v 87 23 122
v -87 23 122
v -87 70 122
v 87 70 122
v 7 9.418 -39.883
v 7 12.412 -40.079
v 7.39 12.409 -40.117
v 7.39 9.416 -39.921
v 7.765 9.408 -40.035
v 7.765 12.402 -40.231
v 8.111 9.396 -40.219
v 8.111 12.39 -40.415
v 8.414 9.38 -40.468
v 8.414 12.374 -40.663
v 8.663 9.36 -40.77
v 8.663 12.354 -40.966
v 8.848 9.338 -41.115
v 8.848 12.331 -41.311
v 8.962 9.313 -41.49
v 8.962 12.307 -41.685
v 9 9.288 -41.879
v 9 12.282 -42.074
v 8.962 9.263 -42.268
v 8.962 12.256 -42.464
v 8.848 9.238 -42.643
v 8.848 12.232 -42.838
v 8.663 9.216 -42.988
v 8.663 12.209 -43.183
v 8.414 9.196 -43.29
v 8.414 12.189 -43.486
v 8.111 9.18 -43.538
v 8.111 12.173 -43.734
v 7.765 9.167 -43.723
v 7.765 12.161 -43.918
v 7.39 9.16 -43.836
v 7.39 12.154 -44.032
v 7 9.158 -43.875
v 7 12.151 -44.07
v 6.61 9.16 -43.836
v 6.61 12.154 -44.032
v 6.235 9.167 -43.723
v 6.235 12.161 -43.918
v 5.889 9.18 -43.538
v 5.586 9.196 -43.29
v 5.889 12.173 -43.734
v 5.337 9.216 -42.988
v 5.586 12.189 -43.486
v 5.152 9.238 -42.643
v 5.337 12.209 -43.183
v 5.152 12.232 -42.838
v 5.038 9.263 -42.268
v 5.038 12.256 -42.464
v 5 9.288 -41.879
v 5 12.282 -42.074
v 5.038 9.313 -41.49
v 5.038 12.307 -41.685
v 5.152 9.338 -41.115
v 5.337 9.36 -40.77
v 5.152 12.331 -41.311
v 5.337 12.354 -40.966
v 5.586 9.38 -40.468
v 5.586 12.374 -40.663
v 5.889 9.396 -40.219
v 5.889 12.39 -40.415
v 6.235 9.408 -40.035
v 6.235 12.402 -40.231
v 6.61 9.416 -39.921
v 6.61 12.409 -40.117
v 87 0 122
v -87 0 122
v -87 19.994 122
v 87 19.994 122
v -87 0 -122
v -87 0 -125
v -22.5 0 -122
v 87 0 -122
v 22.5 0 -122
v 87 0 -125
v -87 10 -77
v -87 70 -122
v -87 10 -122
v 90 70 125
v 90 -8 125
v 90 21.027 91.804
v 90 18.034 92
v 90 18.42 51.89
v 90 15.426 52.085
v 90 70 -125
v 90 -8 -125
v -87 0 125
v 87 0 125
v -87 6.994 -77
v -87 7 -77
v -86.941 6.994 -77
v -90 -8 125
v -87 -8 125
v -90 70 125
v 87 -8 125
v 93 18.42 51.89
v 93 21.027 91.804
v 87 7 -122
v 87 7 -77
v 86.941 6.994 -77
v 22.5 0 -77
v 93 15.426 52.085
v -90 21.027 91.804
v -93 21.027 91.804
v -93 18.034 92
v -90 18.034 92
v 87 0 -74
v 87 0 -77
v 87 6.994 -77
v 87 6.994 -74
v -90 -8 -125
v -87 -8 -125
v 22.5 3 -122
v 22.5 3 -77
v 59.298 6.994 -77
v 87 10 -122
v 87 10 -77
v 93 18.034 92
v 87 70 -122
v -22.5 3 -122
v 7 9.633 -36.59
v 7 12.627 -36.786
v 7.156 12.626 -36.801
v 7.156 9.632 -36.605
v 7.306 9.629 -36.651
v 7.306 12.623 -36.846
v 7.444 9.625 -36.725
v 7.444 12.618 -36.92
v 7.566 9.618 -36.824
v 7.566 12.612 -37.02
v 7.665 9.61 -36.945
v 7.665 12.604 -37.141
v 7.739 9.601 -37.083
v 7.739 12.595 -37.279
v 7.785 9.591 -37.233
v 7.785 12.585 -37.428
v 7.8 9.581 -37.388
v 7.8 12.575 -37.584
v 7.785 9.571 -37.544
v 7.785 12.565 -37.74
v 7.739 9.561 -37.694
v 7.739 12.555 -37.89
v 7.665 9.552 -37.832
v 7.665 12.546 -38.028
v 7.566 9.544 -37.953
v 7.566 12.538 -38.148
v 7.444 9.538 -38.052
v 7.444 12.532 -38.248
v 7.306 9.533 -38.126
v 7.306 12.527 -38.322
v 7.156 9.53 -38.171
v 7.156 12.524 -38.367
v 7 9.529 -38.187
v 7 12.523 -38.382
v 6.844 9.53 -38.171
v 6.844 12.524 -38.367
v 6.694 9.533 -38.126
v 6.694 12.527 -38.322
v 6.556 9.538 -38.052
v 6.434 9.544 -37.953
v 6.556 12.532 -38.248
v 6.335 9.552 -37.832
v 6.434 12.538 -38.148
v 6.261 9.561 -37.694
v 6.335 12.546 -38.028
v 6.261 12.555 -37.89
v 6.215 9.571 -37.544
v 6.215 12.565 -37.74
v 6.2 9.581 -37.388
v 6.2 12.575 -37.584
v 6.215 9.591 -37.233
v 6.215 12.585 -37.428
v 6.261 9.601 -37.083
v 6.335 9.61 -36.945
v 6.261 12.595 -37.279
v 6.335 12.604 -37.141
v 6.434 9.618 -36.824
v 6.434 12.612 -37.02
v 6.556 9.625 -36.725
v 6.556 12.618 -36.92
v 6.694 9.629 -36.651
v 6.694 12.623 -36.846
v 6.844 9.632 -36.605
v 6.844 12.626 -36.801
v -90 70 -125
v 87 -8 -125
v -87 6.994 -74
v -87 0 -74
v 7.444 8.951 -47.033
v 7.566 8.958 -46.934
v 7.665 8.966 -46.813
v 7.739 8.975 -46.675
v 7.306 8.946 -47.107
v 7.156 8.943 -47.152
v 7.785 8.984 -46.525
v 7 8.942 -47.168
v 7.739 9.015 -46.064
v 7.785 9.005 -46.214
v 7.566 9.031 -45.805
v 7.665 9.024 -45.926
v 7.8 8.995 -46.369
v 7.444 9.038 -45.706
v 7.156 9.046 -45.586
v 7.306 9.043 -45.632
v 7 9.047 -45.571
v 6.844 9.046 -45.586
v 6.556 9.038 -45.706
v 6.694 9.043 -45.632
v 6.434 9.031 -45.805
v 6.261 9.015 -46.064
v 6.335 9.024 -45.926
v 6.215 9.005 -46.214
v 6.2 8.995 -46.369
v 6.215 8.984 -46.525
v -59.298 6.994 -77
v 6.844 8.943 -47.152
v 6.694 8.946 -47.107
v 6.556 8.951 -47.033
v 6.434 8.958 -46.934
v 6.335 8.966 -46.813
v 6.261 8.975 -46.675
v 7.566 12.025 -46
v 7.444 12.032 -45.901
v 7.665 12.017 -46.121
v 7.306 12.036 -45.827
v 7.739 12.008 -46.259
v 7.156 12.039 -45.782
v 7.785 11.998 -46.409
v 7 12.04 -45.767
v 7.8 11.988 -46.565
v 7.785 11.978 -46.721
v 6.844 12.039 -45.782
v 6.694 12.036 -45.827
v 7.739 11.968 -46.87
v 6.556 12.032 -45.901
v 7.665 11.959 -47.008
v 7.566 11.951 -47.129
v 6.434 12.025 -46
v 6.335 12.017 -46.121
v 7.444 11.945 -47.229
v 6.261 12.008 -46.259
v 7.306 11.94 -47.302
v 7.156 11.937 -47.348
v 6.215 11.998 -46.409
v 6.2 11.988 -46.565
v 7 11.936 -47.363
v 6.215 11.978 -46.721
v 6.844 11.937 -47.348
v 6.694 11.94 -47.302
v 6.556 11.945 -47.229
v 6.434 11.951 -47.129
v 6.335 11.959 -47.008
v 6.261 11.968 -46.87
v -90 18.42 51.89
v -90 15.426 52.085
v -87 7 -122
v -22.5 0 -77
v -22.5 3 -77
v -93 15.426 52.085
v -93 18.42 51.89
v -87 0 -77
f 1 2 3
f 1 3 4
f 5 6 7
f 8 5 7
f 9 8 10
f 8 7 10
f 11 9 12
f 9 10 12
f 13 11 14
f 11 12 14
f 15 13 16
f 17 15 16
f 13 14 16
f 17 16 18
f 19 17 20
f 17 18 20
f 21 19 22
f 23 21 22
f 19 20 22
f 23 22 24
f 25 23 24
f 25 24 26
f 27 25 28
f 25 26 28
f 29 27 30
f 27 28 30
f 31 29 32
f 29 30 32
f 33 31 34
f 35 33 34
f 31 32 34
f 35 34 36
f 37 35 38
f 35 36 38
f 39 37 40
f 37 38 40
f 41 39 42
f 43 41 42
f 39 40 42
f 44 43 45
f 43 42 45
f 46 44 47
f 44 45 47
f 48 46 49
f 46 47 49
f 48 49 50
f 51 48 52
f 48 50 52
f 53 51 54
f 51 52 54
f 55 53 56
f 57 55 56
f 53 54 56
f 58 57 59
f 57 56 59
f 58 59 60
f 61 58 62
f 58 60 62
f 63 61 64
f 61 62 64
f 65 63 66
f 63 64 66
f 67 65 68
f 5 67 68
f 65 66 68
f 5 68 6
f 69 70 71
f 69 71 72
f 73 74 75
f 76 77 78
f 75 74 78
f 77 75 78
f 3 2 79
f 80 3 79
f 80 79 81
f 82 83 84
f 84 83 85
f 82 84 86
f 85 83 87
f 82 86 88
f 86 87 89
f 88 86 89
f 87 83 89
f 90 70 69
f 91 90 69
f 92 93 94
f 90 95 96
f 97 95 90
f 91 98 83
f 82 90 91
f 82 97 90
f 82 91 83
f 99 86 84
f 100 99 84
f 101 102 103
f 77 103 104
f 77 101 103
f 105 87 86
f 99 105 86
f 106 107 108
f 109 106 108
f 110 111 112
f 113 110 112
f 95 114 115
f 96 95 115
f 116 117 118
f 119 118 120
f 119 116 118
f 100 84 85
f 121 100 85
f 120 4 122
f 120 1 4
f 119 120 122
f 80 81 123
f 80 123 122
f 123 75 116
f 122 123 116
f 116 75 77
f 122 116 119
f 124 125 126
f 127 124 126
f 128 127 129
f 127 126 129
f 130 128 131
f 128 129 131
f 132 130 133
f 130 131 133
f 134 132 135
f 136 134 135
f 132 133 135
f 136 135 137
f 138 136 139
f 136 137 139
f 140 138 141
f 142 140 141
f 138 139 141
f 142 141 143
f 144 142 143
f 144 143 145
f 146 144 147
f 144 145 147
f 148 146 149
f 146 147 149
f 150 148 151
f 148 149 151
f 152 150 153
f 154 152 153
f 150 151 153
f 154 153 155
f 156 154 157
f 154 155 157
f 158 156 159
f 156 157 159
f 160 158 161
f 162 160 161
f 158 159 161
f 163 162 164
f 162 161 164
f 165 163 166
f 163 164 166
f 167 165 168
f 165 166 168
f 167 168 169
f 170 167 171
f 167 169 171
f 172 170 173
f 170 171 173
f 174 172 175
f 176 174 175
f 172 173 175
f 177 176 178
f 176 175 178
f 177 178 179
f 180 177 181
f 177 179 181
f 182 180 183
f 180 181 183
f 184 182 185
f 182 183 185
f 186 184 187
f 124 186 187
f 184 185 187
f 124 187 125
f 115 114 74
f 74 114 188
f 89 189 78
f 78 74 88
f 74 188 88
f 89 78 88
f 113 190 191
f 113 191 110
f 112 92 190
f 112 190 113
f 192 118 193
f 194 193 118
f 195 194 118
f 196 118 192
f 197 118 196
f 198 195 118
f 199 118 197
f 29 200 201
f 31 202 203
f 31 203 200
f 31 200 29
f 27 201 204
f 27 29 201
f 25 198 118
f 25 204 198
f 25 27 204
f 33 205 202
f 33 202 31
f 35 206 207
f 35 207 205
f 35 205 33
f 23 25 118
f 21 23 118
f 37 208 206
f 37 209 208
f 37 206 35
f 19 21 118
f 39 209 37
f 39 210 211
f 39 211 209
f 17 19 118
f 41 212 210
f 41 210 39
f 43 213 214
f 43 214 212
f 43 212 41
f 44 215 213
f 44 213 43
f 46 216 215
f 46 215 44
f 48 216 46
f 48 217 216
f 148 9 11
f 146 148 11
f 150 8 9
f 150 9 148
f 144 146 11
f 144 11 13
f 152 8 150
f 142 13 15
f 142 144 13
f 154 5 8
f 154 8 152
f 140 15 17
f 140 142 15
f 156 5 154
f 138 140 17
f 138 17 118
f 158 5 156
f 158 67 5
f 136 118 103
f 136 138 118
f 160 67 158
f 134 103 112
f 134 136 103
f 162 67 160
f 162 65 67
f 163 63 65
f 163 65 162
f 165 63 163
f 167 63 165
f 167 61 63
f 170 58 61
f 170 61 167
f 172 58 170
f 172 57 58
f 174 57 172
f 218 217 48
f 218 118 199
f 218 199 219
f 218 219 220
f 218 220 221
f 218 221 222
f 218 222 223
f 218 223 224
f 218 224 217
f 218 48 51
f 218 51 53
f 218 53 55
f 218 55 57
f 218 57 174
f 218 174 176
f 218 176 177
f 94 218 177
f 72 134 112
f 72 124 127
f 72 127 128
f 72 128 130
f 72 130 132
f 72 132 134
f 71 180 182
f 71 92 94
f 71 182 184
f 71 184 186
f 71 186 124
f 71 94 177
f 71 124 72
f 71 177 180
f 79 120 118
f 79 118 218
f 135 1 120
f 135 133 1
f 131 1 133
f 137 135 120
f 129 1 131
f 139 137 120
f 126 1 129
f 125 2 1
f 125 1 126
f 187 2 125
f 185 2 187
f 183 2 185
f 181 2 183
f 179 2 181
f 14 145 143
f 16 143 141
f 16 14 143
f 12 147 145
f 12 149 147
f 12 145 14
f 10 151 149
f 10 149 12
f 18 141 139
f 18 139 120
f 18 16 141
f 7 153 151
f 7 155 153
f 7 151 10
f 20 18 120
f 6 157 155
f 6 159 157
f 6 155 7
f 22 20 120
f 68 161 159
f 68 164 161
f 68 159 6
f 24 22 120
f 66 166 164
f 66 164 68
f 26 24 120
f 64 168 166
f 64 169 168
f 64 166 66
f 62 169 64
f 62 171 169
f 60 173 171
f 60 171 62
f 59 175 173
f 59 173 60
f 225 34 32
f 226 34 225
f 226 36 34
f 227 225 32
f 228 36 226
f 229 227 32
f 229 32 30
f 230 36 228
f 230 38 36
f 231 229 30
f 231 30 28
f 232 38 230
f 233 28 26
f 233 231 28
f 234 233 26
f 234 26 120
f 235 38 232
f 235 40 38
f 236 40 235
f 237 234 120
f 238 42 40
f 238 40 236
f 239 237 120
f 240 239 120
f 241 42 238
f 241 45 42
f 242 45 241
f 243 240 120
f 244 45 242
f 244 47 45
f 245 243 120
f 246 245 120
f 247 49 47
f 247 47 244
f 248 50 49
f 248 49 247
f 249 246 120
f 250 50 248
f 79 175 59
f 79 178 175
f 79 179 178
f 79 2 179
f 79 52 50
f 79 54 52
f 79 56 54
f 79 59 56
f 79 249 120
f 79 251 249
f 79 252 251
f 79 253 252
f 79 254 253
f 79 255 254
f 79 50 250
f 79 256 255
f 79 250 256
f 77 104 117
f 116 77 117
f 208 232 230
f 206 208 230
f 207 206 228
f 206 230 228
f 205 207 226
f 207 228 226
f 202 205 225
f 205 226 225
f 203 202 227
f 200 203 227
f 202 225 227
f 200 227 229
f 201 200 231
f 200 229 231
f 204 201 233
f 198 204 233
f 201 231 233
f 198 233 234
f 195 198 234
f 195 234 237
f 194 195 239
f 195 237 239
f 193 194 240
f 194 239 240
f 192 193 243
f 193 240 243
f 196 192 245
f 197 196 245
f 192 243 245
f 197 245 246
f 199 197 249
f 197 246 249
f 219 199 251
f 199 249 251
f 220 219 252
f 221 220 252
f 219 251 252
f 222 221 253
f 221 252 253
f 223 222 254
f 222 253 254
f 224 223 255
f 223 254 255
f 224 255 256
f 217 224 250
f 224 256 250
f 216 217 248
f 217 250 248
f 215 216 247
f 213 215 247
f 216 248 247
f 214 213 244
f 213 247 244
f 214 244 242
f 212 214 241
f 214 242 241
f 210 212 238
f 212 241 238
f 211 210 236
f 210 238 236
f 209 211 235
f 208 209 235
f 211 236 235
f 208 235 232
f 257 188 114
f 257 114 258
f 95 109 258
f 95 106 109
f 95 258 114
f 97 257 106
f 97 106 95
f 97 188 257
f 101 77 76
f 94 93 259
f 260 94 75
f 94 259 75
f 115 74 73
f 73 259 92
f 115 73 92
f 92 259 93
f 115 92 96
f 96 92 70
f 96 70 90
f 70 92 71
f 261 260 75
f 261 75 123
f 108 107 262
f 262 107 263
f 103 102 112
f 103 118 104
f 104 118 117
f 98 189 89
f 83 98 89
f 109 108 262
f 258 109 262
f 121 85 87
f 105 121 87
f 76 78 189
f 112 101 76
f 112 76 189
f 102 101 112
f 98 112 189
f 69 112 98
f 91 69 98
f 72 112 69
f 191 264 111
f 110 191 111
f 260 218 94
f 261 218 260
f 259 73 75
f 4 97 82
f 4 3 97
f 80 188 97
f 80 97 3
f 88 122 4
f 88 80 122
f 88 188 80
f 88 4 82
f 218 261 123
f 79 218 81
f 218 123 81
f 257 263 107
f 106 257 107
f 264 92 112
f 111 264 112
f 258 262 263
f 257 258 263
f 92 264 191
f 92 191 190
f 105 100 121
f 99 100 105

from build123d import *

# Parameters (mm, degrees)
SKETCH_1_W           = 180
SKETCH_1_H           = 250
EXTRUDE_1_DEPTH      = 70
SHELL_1_T            = -3
EXTRUDE_2_REACH      = 229.715
EXTRUDE_3_DEPTH      = 45
SKETCH_5_W           = 174
SKETCH_5_H           = 6.993605462
EXTRUDE_6_DEPTH      = 3
EXTRUDE_7_DEPTH      = 180
EXTRUDE_7_DEPTH_BACK = 6
SKETCH_12_W          = 3
SKETCH_12_H          = 250
EXTRUDE_8_DEPTH      = 8
SKETCH_13_R          = 2
SKETCH_13_R_2        = 0.8
CUT_EXTRUDE_1_DEPTH  = 3


with BuildPart() as part:
    # 草图1 → 凸台-拉伸1 (new body)
    with BuildSketch(Plane(origin=(0, 0, 0), x_dir=(1, 0, 0), z_dir=(0, 1, 0))):
        Rectangle(SKETCH_1_W, SKETCH_1_H)
    extrude(amount=EXTRUDE_1_DEPTH)

    # 抽壳1
    shell_1_openings = [part.faces().sort_by_distance(p)[0] for p in [
        (0, 70, 0),
        (0, 0, 0),
    ]]
    offset(amount=SHELL_1_T, openings=shell_1_openings, kind=Kind.INTERSECTION)

    # 草图3 → 凸台-拉伸2 (add, up to next)
    with BuildSketch(Plane(origin=(-87, 0, 0), x_dir=(0, 0, -1), z_dir=(1, 0, 0)), mode=Mode.PRIVATE) as extrude_2_sk1:
        Polygon((-122, 23), (77, 10), (77, 6.993605462), (-122, 19.993605462), align=None)
    extrude_2_tool1 = extrude(extrude_2_sk1.sketch, amount=EXTRUDE_2_REACH, mode=Mode.PRIVATE) - part.part
    add(extrude_2_tool1.solids().sort_by_distance((-87, 14.996803, 22.5))[0])

    # 草图4 → 凸台-拉伸3 (add)
    with BuildSketch(Plane.XY.offset(-122)):
        Polygon((-87, 10), (-87, 7), (-22.5, 0), (-22.5, 3), align=None)
        Polygon((22.5, 3), (87, 10), (87, 7), (22.5, 0), align=None)
    extrude(amount=EXTRUDE_3_DEPTH)

    # 草图6 → 凸台-拉伸7 (add, two sides: drawn at the far end of the back side and taken through both)
    with BuildSketch(Plane(origin=(-87, 0, 0), x_dir=(0, 0, -1), z_dir=(1, 0, 0)).offset(-EXTRUDE_7_DEPTH_BACK)):
        Polygon((-92, 18.033806467), (-52.085079166, 15.426299075), (-51.889516111, 18.419918138), (-91.804436946, 21.027425529), align=None)
    extrude(amount=EXTRUDE_7_DEPTH + EXTRUDE_7_DEPTH_BACK)

    # 草图12 → 凸台-拉伸8 (add)
    with BuildSketch(Plane.XZ):
        with Locations((-88.5, 0)):
            Rectangle(SKETCH_12_W, SKETCH_12_H)
        with Locations((88.5, 0)):
            Rectangle(SKETCH_12_W, SKETCH_12_H)
    extrude(amount=EXTRUDE_8_DEPTH)

    # 草图13 → 切除-拉伸1 (cut)
    with BuildSketch(Plane(origin=(0, 14.966281116, -0.977696756), x_dir=(1, 0, 0), z_dir=(0, 0.9978730208564016, -0.06518768477956395))):
        with Locations(Location((7, 41.184345758, 0), (0, 0, 270))):
            Circle(SKETCH_13_R)
        with Locations(Location((7, 45.684345758, 0), (0, 0, 270))):
            Circle(SKETCH_13_R_2)
        with Locations(Location((7, 36.684345758, 0), (0, 0, 270))):
            Circle(SKETCH_13_R_2)
    extrude(amount=-CUT_EXTRUDE_1_DEPTH, mode=Mode.SUBTRACT)


with BuildPart() as body_2:
    # 草图5 → 凸台-拉伸6 (new body)
    with BuildSketch(Plane.XY.offset(-77)):
        with Locations((0, 3.496802731)):
            Rectangle(SKETCH_5_W, SKETCH_5_H)
    extrude(amount=EXTRUDE_6_DEPTH)


solid = Compound([part.part, body_2.part])
